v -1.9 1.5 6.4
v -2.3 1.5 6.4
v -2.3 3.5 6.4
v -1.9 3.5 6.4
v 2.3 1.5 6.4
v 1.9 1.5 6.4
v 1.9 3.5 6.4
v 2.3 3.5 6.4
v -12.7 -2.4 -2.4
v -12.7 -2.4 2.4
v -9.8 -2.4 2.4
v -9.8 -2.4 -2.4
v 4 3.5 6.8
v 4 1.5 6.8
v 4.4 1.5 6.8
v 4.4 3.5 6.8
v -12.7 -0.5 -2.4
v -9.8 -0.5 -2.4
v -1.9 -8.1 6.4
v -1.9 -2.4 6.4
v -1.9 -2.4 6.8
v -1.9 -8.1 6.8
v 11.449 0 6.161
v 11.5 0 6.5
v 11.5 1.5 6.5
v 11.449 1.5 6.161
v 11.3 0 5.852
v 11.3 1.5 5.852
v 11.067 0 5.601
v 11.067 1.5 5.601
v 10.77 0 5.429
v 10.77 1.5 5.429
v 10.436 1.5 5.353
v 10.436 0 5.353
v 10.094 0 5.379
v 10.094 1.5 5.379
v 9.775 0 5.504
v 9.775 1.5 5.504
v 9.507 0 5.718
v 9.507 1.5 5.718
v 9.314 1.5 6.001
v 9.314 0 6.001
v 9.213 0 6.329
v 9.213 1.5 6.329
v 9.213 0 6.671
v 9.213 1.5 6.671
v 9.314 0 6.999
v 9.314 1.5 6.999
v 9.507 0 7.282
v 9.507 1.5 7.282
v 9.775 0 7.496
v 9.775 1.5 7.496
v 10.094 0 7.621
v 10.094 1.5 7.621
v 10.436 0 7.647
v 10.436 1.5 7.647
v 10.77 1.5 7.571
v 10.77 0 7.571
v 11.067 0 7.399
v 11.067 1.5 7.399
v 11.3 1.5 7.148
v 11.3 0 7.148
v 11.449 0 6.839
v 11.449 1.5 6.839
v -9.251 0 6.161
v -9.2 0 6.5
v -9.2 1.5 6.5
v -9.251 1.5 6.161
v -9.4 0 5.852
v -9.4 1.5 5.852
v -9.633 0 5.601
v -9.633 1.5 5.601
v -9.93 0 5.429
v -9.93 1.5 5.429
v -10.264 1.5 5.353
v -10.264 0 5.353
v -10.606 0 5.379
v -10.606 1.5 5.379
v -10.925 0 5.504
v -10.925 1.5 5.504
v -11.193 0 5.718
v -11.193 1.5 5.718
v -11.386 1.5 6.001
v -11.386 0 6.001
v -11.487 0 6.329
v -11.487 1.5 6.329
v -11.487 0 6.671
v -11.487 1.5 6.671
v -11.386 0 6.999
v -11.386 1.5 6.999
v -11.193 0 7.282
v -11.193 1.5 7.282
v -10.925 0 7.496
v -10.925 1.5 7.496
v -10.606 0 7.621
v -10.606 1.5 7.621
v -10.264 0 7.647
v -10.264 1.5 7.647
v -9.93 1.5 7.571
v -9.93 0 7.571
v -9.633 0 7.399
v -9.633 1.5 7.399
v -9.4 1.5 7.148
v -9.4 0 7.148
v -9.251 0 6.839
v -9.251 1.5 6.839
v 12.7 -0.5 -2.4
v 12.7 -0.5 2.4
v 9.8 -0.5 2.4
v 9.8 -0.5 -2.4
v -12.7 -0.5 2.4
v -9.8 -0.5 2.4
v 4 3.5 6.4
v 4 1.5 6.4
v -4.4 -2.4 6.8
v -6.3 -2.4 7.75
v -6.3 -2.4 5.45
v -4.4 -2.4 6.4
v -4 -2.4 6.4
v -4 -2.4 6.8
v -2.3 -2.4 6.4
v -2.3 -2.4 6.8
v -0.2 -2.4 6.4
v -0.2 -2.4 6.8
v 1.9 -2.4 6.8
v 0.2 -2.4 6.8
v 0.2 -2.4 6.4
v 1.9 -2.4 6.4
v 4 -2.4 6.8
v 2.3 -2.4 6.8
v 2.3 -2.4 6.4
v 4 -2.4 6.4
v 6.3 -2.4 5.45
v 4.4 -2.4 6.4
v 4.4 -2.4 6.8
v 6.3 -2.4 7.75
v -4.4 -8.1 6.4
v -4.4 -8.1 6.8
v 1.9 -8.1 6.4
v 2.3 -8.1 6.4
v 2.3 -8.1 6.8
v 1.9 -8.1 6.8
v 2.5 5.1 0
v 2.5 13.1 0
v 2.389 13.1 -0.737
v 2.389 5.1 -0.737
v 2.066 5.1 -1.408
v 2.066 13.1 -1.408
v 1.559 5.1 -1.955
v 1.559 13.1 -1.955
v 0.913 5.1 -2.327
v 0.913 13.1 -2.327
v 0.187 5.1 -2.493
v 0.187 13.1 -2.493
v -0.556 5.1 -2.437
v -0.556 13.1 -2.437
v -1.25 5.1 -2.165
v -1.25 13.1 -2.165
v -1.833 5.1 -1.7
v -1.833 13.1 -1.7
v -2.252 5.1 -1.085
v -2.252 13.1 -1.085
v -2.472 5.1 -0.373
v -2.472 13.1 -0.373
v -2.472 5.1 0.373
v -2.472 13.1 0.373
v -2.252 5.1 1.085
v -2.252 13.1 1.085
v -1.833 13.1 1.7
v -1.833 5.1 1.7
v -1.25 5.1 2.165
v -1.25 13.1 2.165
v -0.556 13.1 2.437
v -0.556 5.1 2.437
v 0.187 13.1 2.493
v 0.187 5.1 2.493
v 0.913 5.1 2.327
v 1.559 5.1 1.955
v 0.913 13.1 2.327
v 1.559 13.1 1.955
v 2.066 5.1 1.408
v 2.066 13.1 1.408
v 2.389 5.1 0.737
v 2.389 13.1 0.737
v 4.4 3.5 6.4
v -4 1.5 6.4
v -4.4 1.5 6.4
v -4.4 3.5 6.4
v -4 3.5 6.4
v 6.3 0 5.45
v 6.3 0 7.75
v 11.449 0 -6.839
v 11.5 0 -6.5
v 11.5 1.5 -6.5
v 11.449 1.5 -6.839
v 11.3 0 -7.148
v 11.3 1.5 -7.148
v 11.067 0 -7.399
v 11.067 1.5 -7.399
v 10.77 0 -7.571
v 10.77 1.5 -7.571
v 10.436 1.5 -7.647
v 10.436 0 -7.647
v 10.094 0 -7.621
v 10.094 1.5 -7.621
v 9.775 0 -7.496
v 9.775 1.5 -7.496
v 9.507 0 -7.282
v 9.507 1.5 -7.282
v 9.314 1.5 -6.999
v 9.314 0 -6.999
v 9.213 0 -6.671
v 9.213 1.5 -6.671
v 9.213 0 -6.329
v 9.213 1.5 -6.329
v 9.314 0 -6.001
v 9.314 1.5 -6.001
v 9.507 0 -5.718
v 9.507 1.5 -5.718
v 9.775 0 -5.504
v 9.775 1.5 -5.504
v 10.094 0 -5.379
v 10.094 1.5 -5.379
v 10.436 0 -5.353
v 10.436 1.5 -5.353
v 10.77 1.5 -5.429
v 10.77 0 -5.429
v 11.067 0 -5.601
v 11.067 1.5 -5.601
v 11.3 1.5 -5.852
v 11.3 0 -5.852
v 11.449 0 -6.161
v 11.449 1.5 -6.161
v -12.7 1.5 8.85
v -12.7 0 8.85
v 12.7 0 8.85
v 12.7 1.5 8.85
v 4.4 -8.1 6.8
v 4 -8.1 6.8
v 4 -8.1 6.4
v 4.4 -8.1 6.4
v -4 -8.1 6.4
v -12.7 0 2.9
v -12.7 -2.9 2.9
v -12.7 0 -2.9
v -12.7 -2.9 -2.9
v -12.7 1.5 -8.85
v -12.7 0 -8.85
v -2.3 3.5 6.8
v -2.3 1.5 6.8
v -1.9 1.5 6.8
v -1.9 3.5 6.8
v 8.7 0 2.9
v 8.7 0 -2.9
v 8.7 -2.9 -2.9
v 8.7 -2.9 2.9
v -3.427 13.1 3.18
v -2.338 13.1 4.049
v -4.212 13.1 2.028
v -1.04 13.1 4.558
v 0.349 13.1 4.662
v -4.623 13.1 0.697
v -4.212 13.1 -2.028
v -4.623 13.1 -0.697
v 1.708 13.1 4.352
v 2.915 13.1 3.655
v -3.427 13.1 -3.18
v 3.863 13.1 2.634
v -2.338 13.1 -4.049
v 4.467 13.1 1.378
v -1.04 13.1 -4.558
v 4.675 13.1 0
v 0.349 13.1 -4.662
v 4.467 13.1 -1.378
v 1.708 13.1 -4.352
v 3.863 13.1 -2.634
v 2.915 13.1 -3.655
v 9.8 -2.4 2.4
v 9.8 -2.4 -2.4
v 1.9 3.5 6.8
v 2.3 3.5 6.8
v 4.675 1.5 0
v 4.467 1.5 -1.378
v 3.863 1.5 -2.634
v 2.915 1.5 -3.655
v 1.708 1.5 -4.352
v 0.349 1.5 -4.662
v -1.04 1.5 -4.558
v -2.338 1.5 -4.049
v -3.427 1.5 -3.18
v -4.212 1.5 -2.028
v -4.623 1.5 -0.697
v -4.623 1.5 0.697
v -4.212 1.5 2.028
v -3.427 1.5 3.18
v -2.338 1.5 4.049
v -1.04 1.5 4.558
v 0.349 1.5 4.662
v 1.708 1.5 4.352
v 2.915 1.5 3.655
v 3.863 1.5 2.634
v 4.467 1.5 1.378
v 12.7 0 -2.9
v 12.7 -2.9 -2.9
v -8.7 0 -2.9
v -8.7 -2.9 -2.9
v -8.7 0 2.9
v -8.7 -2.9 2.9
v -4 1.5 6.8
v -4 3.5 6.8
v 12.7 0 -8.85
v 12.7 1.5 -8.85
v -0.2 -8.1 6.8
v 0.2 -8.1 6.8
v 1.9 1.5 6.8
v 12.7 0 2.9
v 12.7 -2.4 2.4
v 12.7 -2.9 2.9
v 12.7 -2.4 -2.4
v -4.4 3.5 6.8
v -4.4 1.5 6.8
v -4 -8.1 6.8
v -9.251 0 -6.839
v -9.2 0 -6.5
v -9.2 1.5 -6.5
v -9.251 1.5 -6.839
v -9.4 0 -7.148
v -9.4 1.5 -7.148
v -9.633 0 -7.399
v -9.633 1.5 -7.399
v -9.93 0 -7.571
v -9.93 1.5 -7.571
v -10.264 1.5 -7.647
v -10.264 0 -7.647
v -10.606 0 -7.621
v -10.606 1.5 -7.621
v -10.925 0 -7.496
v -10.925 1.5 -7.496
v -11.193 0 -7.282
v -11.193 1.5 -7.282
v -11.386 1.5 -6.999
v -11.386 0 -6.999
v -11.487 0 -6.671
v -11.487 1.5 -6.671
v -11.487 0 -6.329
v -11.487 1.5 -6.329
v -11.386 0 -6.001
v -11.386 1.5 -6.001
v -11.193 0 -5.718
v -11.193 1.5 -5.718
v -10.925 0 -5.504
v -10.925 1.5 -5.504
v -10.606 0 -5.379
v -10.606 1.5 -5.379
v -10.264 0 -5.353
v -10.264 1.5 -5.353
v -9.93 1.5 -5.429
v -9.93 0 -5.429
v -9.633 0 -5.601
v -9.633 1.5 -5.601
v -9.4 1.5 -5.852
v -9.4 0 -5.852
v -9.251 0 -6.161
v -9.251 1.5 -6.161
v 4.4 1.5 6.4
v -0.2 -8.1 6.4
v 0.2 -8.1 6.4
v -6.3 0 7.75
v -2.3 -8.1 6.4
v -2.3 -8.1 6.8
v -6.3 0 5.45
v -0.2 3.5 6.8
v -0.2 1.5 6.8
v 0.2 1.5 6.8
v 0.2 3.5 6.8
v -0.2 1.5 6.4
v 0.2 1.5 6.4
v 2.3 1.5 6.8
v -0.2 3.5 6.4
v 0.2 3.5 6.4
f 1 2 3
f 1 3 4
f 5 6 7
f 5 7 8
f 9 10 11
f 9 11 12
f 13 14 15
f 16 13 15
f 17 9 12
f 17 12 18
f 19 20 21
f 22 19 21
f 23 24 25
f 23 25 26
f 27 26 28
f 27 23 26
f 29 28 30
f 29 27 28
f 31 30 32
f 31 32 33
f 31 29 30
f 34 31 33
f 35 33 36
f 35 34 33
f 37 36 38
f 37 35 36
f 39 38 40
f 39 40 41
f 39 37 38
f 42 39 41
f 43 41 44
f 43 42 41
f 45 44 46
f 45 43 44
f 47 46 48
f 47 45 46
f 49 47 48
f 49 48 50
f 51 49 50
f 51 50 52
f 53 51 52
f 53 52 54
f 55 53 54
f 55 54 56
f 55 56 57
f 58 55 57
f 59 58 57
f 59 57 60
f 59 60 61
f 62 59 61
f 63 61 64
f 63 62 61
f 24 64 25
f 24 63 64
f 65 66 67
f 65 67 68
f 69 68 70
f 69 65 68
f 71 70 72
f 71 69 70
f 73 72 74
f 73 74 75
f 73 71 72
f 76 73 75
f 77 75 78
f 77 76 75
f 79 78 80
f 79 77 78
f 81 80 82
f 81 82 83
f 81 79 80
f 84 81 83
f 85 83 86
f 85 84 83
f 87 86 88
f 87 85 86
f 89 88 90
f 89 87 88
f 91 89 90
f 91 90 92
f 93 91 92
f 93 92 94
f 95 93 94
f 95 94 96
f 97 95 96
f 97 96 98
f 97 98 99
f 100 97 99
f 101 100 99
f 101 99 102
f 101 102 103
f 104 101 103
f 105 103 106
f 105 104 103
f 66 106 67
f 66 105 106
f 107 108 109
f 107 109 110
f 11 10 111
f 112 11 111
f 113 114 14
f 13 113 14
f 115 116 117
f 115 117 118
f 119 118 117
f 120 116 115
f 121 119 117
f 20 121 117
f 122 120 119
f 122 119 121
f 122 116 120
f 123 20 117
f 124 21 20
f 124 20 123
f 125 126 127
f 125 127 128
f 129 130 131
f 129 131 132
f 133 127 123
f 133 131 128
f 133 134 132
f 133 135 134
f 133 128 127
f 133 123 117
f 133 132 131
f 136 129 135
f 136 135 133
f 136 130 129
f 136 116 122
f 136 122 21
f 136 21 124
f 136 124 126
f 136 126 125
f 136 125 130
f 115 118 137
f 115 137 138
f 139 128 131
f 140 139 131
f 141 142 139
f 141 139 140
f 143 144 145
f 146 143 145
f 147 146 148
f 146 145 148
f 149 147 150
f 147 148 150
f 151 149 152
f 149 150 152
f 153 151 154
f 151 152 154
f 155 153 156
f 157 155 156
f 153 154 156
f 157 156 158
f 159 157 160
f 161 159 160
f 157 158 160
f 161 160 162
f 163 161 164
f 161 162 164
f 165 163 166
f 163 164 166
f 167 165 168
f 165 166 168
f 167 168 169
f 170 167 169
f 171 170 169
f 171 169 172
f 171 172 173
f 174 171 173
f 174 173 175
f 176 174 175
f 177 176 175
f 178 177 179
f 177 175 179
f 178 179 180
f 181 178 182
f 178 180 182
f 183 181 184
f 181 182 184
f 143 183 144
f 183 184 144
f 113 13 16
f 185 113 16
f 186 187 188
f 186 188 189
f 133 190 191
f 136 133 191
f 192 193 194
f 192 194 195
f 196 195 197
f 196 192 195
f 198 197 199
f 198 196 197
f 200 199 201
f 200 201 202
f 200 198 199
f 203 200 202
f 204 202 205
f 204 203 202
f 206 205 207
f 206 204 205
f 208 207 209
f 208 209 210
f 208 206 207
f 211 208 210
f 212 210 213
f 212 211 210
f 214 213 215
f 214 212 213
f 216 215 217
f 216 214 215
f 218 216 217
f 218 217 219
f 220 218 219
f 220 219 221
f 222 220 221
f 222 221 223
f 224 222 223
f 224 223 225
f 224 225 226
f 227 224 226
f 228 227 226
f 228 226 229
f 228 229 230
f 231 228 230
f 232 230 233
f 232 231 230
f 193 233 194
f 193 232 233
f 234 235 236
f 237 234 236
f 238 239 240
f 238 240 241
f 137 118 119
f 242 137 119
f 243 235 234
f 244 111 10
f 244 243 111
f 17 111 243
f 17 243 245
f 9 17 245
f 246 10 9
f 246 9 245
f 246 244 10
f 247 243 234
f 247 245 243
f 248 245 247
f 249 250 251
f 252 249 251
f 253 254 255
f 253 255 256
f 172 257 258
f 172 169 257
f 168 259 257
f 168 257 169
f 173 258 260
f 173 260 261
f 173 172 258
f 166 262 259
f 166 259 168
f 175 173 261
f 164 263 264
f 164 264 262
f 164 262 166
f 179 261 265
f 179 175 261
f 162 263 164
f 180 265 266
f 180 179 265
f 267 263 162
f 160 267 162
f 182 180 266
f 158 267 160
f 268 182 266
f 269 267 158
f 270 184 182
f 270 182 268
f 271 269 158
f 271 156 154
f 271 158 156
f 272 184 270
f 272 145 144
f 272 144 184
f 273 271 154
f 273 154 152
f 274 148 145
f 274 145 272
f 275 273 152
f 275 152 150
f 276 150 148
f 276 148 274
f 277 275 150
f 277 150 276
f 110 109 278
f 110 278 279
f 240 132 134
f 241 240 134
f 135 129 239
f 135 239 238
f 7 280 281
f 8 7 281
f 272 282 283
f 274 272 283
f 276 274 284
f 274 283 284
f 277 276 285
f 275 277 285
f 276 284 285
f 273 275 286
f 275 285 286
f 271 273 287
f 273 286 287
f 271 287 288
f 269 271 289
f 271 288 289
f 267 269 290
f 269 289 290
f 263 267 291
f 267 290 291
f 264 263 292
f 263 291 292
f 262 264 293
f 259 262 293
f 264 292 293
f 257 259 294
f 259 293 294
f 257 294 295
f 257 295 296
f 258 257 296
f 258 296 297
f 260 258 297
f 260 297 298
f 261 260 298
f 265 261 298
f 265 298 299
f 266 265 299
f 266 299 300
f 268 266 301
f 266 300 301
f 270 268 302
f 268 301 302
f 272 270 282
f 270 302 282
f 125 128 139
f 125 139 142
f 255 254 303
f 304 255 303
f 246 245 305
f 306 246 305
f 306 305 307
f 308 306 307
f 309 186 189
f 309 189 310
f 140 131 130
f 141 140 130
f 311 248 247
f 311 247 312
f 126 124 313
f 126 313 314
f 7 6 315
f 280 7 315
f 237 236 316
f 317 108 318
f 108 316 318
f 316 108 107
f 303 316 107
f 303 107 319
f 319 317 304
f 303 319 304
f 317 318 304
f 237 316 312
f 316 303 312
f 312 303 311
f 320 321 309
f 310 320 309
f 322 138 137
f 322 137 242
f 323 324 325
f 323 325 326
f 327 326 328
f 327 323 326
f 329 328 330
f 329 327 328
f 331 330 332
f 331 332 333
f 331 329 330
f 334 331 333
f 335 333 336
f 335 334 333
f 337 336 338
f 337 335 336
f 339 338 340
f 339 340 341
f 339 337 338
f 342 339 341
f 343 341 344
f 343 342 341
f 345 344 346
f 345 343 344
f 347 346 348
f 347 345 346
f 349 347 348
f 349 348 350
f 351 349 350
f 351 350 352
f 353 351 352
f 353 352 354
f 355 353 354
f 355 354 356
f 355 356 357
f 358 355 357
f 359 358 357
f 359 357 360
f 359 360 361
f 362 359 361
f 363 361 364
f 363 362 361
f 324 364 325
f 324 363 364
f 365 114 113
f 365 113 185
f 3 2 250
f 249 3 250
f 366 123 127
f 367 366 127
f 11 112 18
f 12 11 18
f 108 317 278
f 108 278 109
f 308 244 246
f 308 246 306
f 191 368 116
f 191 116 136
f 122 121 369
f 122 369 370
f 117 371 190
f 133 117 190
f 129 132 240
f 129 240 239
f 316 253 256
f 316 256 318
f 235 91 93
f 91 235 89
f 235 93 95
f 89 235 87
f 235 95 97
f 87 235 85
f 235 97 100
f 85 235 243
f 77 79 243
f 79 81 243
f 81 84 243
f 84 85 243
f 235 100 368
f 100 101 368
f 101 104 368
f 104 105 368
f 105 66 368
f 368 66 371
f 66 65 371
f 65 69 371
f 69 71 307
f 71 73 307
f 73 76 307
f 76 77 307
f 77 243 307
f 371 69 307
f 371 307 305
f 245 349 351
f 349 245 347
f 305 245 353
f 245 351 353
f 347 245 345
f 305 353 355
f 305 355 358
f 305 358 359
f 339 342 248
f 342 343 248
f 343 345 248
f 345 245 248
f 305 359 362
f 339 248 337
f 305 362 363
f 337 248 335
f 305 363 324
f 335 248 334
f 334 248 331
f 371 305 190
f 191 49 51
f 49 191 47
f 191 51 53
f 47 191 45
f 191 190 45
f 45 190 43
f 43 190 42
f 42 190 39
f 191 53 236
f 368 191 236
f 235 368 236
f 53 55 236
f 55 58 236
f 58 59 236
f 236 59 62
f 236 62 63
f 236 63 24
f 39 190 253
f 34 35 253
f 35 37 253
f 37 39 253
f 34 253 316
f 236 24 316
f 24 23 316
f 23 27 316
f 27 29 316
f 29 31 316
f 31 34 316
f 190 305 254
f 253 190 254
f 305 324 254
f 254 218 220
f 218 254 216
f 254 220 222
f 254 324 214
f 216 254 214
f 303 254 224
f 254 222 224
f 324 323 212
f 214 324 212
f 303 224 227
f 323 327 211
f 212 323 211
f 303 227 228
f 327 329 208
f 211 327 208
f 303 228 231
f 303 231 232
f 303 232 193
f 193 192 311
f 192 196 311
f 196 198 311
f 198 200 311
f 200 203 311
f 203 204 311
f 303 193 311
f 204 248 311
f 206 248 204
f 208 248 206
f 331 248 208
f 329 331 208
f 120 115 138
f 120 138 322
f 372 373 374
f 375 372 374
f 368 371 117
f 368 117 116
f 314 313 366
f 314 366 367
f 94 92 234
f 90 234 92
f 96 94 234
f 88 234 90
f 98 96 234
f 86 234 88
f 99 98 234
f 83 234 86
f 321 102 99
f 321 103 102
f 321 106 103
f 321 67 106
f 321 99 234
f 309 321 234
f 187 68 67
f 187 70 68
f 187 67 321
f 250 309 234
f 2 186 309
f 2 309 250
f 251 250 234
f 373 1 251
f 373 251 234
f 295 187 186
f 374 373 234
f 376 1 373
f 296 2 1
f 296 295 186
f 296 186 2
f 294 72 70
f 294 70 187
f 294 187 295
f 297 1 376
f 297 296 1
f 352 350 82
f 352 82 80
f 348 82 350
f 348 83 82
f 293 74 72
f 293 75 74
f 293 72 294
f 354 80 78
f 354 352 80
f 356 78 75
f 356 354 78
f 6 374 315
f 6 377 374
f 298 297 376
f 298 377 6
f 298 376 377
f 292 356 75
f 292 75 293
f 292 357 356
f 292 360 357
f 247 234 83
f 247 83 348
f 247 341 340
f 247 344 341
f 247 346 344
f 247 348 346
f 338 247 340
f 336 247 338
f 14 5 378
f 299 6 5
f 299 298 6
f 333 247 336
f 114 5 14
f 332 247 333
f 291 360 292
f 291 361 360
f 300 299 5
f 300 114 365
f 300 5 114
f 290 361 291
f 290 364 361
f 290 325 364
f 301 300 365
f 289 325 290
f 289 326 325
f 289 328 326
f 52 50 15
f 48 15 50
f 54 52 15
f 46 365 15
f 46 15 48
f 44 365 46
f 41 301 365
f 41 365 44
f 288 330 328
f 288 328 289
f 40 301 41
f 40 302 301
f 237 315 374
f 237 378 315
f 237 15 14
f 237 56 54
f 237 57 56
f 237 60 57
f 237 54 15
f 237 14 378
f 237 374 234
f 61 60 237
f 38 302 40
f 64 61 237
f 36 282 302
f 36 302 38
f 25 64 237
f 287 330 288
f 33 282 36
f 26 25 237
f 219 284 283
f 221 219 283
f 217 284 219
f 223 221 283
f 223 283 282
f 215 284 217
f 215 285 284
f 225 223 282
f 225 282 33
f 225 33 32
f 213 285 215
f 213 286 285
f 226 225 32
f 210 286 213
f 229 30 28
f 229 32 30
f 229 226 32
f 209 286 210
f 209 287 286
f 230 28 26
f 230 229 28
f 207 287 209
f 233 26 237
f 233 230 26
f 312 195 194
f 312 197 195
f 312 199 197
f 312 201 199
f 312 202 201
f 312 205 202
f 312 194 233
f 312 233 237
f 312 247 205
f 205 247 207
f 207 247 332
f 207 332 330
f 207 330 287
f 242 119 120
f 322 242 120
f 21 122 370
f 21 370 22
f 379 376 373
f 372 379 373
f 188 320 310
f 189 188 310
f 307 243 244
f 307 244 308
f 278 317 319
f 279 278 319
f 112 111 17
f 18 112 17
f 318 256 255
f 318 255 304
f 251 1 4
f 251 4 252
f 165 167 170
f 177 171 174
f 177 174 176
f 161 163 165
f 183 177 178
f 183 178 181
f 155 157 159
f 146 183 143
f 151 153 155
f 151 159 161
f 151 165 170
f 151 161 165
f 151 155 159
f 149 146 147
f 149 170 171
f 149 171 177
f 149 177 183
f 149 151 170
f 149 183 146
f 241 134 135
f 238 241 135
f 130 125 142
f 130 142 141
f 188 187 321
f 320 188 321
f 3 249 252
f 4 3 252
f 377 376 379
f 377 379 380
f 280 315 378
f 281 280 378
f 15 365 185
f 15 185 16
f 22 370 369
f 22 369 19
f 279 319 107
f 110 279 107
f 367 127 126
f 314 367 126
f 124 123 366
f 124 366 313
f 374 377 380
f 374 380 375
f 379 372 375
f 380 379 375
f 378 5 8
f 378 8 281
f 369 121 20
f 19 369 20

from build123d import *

# Parameters (mm, degrees)
SKETCH1_W                = 25.4
SKETCH1_H                = 17.7
SKETCH1_R                = 1.15
BOSS_EXTRUDE1_DEPTH      = 1.5
SKETCH2_R                = 4.675
BOSS_EXTRUDE2_DEPTH      = 11.6
SKETCH3_R                = 2.5
CUT_EXTRUDE1_DEPTH       = 8
SKETCH4_W                = 4
SKETCH4_H                = 5.8
BOSS_EXTRUDE3_DEPTH      = 2.9
SKETCH5_W                = 4.8
SKETCH5_H                = 1.9
CUT_EXTRUDE2_DEPTH       = 2.9
SKETCH6_W                = 12.6
SKETCH6_H                = 2.3
BOSS_EXTRUDE4_DEPTH      = 2.4
SKETCH7_W                = 0.4
SKETCH7_H                = 0.4
BOSS_EXTRUDE5_DEPTH      = 5.7
BOSS_EXTRUDE5_DEPTH_BACK = 5.9


with BuildPart() as part:
    # Sketch1 → Boss-Extrude1 (new body)
    with BuildSketch(Plane(origin=(0, 0, 0), x_dir=(1, 0, 0), z_dir=(0, 1, 0))):
        Rectangle(SKETCH1_W, SKETCH1_H)
        with Locations((10.35, 6.5)):
            Circle(SKETCH1_R, mode=Mode.SUBTRACT)
        with Locations((10.35, -6.5)):
            Circle(SKETCH1_R, mode=Mode.SUBTRACT)
        with Locations((-10.35, -6.5)):
            Circle(SKETCH1_R, mode=Mode.SUBTRACT)
        with Locations((-10.35, 6.5)):
            Circle(SKETCH1_R, mode=Mode.SUBTRACT)
    extrude(amount=BOSS_EXTRUDE1_DEPTH)

    # Sketch2 → Boss-Extrude2 (add)
    with BuildSketch(Plane(origin=(0, 1.5, 0), x_dir=(1, 0, 0), z_dir=(0, 1, 0))):
        Circle(SKETCH2_R)
    extrude(amount=BOSS_EXTRUDE2_DEPTH)

    # Sketch3 → Cut-Extrude1 (cut)
    with BuildSketch(Plane(origin=(0, 13.1, 0), x_dir=(1, 0, 0), z_dir=(0, 1, 0))):
        Circle(SKETCH3_R)
    extrude(amount=-CUT_EXTRUDE1_DEPTH, mode=Mode.SUBTRACT)

    # Sketch4 → Boss-Extrude3 (add)
    with BuildSketch(Plane.XZ):
        with Locations((10.7, 0)):
            Rectangle(SKETCH4_W, SKETCH4_H)
        with Locations((-10.7, 0)):
            Rectangle(SKETCH4_W, SKETCH4_H)
    extrude(amount=BOSS_EXTRUDE3_DEPTH)

    # Sketch5 → Cut-Extrude2 (cut)
    with BuildSketch(Plane(origin=(12.7, 0, 0), x_dir=(0, 0, -1), z_dir=(1, 0, 0))):
        with Locations((0, -1.45)):
            Rectangle(SKETCH5_W, SKETCH5_H)
    cut_extrude2 = extrude(amount=-CUT_EXTRUDE2_DEPTH, mode=Mode.SUBTRACT)

    # Mirror1: Cut-Extrude2 across plane
    add(cut_extrude2.mirror(Plane(origin=(0, 0, 0), x_dir=(0, 0, 1), z_dir=(1, 0, 0))), mode=Mode.SUBTRACT)

    # Sketch6 → Boss-Extrude4 (add)
    with BuildSketch(Plane.XZ):
        with Locations((0, 6.6)):
            Rectangle(SKETCH6_W, SKETCH6_H)
    extrude(amount=BOSS_EXTRUDE4_DEPTH)

    # Sketch7 → Boss-Extrude5 (add, two sides)
    with BuildSketch(Plane.XZ.offset(2.4)) as boss_extrude5_sk:
        with Locations((-4.2, 6.6)):
            Rectangle(SKETCH7_W, SKETCH7_H)
        with Locations((-2.1, 6.6)):
            Rectangle(SKETCH7_W, SKETCH7_H)
        with Locations((0, 6.6)):
            Rectangle(SKETCH7_W, SKETCH7_H)
        with Locations((2.1, 6.6)):
            Rectangle(SKETCH7_W, SKETCH7_H)
        with Locations((4.2, 6.6)):
            Rectangle(SKETCH7_W, SKETCH7_H)
    extrude(amount=BOSS_EXTRUDE5_DEPTH)
    extrude(boss_extrude5_sk.sketch, amount=-BOSS_EXTRUDE5_DEPTH_BACK)


solid = part.part
